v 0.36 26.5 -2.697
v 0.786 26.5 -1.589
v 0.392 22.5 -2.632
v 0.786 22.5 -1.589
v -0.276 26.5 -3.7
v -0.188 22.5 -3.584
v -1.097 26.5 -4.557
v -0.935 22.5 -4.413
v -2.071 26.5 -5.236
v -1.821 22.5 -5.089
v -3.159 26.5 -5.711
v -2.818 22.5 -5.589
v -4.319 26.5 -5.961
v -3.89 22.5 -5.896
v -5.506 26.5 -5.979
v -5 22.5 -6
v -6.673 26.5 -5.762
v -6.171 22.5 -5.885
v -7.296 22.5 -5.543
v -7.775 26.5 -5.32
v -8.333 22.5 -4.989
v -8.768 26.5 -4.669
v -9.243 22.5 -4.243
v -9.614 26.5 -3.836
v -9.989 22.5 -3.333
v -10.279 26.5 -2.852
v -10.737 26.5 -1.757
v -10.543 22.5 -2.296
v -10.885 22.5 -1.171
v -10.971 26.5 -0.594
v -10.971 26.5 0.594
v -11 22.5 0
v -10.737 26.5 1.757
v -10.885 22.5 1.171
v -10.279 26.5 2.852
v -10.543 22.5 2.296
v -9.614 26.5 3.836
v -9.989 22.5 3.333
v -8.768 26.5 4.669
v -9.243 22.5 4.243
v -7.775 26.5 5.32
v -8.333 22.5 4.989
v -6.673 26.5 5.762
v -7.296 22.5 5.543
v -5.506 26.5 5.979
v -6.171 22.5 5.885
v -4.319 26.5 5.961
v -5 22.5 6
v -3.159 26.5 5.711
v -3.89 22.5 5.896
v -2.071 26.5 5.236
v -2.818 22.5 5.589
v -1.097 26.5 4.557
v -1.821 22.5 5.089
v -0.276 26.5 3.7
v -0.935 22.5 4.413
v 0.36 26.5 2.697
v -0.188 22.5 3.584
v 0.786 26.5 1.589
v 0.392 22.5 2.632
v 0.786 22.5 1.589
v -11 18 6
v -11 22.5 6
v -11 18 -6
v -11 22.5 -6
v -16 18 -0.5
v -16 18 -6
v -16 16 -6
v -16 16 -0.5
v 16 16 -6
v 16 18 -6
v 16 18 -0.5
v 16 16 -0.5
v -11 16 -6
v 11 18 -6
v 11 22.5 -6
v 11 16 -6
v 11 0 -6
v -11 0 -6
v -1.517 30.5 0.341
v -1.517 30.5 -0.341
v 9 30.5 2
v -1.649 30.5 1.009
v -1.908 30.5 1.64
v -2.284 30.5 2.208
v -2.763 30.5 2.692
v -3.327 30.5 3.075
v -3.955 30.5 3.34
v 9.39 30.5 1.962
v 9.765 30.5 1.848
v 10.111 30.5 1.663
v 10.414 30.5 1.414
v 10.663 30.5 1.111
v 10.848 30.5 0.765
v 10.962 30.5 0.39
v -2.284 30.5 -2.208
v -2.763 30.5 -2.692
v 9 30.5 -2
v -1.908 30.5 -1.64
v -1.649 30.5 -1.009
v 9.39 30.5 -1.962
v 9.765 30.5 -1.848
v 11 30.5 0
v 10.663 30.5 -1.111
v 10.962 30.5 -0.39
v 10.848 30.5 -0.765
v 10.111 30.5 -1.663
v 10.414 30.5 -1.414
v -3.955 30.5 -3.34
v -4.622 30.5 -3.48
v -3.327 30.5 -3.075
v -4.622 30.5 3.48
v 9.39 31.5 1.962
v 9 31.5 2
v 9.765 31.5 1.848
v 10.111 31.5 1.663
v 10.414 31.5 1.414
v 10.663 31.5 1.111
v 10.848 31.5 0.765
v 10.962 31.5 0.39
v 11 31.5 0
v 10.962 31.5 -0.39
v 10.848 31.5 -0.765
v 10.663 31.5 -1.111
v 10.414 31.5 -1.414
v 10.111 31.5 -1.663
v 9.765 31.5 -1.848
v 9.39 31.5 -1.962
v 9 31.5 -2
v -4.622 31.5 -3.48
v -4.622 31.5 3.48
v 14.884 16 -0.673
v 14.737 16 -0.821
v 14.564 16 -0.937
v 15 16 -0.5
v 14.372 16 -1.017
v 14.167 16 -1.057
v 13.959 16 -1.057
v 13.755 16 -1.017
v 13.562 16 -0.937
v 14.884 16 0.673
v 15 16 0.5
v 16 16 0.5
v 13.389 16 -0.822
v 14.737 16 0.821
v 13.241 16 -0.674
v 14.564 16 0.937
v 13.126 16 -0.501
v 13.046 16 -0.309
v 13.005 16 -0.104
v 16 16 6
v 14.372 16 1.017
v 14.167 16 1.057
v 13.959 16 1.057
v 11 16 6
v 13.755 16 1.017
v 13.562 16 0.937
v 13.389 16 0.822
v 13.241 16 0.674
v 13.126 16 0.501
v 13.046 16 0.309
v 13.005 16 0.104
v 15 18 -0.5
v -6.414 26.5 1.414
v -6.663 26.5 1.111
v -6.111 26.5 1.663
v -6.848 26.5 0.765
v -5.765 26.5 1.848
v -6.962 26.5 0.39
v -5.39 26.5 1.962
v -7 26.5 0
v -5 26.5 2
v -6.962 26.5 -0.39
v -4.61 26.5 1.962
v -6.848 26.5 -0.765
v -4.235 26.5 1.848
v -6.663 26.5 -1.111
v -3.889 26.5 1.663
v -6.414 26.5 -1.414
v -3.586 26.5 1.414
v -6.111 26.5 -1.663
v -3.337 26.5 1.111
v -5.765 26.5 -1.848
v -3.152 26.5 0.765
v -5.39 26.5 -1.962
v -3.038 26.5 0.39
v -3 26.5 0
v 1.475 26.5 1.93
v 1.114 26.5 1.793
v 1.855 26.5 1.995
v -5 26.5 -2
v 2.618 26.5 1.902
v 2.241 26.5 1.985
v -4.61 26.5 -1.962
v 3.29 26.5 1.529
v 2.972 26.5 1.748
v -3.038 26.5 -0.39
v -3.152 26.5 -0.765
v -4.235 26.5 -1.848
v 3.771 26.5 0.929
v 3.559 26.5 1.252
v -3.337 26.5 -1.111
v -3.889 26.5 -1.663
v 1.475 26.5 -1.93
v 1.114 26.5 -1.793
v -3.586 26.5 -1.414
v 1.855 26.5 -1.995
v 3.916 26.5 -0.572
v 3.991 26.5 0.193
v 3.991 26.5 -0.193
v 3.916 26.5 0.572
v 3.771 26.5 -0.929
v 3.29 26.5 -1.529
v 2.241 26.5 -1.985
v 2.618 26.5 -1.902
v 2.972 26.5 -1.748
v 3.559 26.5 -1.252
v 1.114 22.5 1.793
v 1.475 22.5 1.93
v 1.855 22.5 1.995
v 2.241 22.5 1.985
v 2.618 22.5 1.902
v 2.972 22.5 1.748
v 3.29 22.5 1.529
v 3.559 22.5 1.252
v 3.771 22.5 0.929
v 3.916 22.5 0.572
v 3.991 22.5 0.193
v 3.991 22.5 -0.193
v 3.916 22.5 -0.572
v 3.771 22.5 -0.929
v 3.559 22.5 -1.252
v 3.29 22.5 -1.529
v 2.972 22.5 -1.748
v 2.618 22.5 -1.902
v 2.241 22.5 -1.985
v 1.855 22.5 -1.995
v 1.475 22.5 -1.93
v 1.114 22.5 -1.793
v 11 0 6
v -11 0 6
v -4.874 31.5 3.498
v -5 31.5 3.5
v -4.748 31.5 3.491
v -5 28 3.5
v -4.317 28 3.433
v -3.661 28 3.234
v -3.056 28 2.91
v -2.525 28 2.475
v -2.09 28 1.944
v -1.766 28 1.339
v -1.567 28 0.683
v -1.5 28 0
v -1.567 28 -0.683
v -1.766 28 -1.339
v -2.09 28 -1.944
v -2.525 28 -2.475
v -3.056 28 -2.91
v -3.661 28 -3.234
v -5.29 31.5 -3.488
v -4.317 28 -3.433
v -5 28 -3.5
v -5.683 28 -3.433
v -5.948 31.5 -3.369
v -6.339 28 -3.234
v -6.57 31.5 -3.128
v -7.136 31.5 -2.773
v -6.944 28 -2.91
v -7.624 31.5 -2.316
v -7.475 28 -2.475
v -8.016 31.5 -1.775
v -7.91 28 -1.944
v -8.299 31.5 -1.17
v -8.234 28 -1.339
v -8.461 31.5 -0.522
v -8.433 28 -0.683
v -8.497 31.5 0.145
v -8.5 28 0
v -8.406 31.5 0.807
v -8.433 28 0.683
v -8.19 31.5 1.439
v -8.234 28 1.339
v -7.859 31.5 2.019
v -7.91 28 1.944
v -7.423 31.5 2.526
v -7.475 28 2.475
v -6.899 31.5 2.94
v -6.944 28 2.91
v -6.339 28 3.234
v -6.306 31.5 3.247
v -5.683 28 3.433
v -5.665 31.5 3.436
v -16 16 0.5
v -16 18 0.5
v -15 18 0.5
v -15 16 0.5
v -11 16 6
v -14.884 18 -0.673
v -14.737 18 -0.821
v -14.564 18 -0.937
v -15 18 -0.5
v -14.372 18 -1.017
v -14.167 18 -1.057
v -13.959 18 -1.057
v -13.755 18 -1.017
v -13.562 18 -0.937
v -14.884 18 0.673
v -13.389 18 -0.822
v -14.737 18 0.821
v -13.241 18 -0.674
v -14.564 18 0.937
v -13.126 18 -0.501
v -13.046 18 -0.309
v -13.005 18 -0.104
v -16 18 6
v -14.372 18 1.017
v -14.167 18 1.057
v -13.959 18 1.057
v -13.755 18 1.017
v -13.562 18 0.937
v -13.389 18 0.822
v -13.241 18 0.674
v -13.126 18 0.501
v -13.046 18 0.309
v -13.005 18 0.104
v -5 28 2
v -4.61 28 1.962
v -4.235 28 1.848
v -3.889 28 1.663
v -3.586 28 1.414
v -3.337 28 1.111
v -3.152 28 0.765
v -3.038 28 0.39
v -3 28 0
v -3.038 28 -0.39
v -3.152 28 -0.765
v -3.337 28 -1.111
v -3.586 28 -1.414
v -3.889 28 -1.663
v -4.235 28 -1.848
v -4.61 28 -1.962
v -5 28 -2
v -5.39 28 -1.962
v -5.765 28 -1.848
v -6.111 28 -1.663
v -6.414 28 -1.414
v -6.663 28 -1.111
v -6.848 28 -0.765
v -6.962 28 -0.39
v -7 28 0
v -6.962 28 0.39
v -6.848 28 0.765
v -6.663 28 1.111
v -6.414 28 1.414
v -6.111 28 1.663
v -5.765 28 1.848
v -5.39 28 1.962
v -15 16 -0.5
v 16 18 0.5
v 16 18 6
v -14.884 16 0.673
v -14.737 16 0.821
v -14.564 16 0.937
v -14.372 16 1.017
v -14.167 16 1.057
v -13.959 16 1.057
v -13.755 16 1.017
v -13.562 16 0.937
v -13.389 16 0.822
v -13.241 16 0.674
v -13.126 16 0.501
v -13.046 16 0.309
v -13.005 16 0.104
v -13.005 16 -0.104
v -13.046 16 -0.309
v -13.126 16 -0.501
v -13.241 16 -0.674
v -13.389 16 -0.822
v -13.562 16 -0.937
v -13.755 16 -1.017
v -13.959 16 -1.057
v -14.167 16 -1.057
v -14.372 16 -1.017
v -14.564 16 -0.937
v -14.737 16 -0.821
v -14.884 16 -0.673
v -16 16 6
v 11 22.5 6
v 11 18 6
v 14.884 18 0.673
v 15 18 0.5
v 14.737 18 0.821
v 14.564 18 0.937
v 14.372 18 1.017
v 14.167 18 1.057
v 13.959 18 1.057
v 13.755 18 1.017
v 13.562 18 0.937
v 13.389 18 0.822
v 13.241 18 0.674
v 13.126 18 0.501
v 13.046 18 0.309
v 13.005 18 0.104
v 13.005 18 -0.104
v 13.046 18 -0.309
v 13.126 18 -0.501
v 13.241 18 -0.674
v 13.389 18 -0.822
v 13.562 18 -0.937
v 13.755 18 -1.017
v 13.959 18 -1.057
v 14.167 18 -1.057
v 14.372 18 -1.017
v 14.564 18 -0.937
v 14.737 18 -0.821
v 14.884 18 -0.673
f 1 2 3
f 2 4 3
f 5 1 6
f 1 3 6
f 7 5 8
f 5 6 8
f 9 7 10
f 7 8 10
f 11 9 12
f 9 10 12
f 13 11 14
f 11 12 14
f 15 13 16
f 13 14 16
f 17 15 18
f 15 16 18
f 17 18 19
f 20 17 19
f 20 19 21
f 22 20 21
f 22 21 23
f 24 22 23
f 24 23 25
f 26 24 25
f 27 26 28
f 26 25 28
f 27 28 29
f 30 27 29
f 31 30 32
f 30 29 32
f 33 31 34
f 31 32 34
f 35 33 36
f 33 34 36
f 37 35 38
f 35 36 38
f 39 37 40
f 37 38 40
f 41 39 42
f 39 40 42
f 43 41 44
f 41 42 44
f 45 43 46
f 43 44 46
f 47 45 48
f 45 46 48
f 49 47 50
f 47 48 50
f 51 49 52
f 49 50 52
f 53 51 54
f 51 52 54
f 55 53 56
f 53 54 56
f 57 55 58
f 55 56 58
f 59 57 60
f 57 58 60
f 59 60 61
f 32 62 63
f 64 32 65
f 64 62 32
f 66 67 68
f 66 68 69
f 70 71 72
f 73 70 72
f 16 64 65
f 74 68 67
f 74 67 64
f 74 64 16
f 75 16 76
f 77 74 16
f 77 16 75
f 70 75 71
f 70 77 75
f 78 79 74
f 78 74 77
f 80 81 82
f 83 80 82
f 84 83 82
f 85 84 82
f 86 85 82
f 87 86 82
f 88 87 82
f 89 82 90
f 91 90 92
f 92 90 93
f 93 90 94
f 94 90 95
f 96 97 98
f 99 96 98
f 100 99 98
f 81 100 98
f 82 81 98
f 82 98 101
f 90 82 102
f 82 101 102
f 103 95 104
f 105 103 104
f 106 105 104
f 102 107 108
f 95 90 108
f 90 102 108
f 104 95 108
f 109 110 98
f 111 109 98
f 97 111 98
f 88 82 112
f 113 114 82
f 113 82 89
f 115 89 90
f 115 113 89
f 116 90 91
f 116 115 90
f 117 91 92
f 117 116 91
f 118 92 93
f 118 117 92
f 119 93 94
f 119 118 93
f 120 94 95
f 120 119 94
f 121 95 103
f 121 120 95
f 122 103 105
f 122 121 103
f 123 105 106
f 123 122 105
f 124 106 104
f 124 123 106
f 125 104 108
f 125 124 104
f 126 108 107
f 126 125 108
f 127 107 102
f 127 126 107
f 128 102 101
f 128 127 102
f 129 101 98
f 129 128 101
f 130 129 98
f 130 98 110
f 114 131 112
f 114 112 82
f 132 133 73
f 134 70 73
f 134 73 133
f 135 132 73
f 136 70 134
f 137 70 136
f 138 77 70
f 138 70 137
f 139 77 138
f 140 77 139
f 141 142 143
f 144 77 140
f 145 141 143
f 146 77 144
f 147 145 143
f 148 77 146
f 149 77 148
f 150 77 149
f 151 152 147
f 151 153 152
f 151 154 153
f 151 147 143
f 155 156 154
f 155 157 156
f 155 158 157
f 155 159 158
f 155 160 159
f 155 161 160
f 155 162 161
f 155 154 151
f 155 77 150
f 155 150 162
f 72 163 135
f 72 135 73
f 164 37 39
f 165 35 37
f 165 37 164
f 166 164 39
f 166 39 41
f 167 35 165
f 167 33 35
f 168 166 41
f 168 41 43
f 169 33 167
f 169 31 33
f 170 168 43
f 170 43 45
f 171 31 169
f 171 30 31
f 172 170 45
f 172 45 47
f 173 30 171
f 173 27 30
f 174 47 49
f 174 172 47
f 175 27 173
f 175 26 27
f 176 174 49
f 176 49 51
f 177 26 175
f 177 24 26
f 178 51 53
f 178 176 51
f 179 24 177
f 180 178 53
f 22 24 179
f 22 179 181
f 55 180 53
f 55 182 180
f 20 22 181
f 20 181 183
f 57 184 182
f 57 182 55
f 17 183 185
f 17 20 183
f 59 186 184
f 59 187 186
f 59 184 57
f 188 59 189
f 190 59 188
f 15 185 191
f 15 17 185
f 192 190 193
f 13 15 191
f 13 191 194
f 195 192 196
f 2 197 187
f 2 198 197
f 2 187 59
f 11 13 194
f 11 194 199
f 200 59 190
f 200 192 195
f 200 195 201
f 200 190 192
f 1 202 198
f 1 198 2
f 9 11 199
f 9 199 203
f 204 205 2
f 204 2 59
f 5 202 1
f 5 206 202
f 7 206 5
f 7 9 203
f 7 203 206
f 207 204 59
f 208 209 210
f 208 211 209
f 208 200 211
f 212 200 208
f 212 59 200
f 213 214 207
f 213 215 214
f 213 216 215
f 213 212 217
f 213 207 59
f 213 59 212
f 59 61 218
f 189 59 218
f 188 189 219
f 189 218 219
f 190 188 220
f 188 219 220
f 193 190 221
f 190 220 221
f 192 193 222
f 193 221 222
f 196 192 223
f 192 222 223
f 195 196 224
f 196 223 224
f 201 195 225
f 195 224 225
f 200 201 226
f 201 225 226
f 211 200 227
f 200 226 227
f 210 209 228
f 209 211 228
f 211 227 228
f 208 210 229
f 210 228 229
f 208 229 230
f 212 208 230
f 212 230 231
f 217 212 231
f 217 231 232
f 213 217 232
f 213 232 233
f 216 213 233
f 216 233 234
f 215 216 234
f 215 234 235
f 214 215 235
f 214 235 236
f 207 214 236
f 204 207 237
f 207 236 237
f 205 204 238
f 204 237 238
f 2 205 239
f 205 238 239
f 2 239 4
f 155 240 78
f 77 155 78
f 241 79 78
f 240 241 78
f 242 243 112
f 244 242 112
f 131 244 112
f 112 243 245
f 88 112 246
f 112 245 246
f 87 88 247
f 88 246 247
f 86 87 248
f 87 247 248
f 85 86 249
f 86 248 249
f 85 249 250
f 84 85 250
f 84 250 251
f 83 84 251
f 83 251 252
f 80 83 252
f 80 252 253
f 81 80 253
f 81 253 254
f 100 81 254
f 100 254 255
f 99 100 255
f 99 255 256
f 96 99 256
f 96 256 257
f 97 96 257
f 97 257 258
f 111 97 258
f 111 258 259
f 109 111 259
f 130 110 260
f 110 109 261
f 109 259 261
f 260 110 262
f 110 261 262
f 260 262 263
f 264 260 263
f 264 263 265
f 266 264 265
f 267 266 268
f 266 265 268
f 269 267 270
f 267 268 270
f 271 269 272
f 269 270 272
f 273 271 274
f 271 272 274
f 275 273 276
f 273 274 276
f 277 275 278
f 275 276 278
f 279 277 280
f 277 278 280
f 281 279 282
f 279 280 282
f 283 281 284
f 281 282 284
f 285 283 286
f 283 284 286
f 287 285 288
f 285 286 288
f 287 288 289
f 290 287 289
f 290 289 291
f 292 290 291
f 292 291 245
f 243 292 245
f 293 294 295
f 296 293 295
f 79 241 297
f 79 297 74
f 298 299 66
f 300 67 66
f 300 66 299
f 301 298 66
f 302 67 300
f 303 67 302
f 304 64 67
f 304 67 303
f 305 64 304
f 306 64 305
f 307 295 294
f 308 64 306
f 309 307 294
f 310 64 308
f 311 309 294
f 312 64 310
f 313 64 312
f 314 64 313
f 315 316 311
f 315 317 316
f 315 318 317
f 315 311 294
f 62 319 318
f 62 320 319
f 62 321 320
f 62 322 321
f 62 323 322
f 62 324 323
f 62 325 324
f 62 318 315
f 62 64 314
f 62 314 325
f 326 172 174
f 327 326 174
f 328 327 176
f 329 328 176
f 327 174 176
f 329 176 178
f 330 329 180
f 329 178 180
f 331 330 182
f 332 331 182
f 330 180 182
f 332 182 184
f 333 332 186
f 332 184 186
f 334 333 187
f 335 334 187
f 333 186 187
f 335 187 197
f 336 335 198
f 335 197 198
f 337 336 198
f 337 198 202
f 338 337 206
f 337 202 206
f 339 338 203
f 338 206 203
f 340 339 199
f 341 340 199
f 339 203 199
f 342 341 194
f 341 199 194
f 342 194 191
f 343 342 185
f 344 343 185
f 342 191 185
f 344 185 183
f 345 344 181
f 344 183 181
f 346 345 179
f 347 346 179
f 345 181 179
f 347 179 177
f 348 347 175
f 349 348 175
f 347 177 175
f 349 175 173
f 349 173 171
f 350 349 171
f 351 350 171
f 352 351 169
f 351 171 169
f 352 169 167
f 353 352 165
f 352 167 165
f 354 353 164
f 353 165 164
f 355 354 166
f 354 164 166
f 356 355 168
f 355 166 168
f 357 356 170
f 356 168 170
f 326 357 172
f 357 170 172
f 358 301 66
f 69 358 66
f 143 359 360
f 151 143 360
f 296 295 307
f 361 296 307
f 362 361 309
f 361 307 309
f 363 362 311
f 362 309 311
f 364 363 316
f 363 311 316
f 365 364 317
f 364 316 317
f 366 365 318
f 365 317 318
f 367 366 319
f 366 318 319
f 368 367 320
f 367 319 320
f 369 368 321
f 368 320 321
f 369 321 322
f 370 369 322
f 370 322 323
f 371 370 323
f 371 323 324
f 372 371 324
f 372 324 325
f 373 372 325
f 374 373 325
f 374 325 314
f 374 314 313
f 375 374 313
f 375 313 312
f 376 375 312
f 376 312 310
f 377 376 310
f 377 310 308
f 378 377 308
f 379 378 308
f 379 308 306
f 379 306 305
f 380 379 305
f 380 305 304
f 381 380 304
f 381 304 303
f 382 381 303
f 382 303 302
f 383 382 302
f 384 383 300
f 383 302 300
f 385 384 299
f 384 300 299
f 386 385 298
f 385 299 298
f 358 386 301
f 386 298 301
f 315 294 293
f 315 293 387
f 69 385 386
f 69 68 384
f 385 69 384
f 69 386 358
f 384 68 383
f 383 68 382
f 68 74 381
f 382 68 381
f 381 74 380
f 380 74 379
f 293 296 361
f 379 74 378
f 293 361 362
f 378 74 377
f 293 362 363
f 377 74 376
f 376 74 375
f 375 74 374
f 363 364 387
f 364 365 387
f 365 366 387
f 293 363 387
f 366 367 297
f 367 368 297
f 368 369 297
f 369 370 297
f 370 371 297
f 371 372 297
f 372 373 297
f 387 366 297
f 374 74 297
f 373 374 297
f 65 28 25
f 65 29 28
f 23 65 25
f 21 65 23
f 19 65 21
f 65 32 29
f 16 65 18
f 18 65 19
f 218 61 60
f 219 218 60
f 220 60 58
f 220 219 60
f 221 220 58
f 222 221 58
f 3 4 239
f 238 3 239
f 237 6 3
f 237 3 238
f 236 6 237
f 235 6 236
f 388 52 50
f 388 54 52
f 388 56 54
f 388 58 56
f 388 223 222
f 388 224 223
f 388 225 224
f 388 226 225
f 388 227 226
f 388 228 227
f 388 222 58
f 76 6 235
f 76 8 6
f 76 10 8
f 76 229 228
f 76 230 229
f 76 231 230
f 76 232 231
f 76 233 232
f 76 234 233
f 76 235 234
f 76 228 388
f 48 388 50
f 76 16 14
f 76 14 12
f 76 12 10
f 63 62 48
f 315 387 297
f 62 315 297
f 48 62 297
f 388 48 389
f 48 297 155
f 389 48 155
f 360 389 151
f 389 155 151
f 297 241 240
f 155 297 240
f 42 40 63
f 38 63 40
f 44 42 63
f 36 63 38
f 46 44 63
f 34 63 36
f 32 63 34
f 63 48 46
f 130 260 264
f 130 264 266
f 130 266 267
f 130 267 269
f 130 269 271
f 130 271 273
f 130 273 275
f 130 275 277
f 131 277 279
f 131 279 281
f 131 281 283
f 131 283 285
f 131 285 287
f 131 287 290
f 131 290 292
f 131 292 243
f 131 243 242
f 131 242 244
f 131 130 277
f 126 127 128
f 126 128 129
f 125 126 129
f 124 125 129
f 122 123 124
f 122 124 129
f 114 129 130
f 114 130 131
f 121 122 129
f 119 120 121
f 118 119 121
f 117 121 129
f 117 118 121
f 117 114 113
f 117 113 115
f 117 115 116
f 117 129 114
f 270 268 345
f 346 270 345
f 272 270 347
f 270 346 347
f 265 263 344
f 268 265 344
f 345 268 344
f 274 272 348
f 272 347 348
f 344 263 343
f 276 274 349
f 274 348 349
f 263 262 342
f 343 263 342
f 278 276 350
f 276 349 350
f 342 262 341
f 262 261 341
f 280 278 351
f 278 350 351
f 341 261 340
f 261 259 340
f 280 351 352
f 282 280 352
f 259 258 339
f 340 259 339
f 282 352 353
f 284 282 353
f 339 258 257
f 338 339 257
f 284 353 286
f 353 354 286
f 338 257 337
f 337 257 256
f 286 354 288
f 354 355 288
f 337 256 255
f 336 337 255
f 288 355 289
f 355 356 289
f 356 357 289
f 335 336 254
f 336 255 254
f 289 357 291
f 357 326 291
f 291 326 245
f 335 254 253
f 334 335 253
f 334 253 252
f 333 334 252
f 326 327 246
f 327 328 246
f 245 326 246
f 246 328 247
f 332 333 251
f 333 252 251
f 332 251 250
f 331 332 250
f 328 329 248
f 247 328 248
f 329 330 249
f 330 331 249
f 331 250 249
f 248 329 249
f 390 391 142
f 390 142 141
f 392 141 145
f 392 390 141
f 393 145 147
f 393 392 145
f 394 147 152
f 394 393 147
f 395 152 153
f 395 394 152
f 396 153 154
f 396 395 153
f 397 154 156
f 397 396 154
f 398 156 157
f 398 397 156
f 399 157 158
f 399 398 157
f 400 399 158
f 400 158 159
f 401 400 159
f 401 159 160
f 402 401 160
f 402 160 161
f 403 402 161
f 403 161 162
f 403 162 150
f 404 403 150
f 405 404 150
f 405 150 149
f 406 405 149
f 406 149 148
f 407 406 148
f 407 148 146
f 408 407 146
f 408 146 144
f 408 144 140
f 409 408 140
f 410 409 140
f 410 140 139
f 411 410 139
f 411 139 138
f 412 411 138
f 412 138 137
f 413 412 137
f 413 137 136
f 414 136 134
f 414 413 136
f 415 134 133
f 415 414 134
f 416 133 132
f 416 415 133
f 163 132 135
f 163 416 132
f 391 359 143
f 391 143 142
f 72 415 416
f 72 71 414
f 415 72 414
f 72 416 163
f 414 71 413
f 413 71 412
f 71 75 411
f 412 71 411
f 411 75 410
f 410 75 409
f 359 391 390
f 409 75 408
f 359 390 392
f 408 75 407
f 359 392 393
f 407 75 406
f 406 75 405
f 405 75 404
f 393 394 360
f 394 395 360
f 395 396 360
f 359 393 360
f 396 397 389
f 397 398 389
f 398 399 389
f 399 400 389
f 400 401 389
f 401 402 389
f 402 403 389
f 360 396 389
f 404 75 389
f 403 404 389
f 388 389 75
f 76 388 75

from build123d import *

# Parameters (mm, degrees)
SKETCH1_W           = 22
SKETCH1_H           = 12
BOSS_EXTRUDE1_DEPTH = 22.5
SKETCH2_W           = 12
SKETCH2_H           = 2
BOSS_EXTRUDE2_DEPTH = 5
CUT_EXTRUDE1_REACH  = 26.819
SKETCH4_R           = 6
BOSS_EXTRUDE3_DEPTH = 4
SKETCH5_R           = 2
BOSS_EXTRUDE4_DEPTH = 4
SKETCH6_R           = 2
BOSS_EXTRUDE5_DEPTH = 1.5
SKETCH7_R           = 3.5
BOSS_EXTRUDE6_DEPTH = 3.5
BOSS_EXTRUDE7_DEPTH = 1


with BuildPart() as part:
    # Sketch1 → Boss-Extrude1 (new body)
    with BuildSketch(Plane(origin=(0, 0, 0), x_dir=(1, 0, 0), z_dir=(0, 1, 0))):
        Rectangle(SKETCH1_W, SKETCH1_H)
    extrude(amount=BOSS_EXTRUDE1_DEPTH)

    # Sketch2 → Boss-Extrude2 (add)
    with BuildSketch(Plane.ZY.offset(11)):
        with Locations((0, 17)):
            Rectangle(SKETCH2_W, SKETCH2_H)
    boss_extrude2 = extrude(amount=BOSS_EXTRUDE2_DEPTH)

    # Sketch3 → Cut-Extrude1 (cut, up to next)
    with BuildSketch(Plane(origin=(0, 18, 0), x_dir=(1, 0, 0), z_dir=(0, 1, 0)), mode=Mode.PRIVATE) as cut_extrude1_sk1:
        with BuildLine():
            Line((-16, 0.5), (-16, -0.5))
            Line((-16, -0.5), (-15, -0.5))
            ThreePointArc((-15, -0.5), (-13, 0), (-15, 0.5))
            Line((-15, 0.5), (-16, 0.5))
        make_face()
    cut_extrude1_tool1 = extrude(cut_extrude1_sk1.sketch, amount=-CUT_EXTRUDE1_REACH, mode=Mode.PRIVATE) & part.part
    cut_extrude1 = cut_extrude1_tool1.solids().sort_by_distance((-14.365975, 18, 0))[0]
    add(cut_extrude1, mode=Mode.SUBTRACT)

    # Mirror1: Boss-Extrude2, Cut-Extrude1 across plane
    add(boss_extrude2.mirror(Plane(origin=(0, 0, 0), x_dir=(0, 0, 1), z_dir=(1, 0, 0))))
    add(cut_extrude1.mirror(Plane(origin=(0, 0, 0), x_dir=(0, 0, 1), z_dir=(1, 0, 0))), mode=Mode.SUBTRACT)

    # Sketch4 → Boss-Extrude3 (add)
    with BuildSketch(Plane(origin=(0, 22.5, 0), x_dir=(1, 0, 0), z_dir=(0, 1, 0))):
        with Locations(Location((-5, 0, 0), (0, 0, 270))):
            Circle(SKETCH4_R)
    extrude(amount=BOSS_EXTRUDE3_DEPTH)

    # Sketch5 → Boss-Extrude4 (add)
    with BuildSketch(Plane(origin=(0, 22.5, 0), x_dir=(1, 0, 0), z_dir=(0, 1, 0))):
        with Locations((2, 0)):
            Circle(SKETCH5_R)
    extrude(amount=BOSS_EXTRUDE4_DEPTH)

    # Sketch6 → Boss-Extrude5 (add)
    with BuildSketch(Plane(origin=(0, 26.5, 0), x_dir=(1, 0, 0), z_dir=(0, 1, 0))):
        with Locations(Location((-5, 0, 0), (0, 0, 270))):
            Circle(SKETCH6_R)
    extrude(amount=BOSS_EXTRUDE5_DEPTH)

    # Sketch7 → Boss-Extrude6 (add)
    with BuildSketch(Plane(origin=(0, 28, 0), x_dir=(1, 0, 0), z_dir=(0, 1, 0))):
        with Locations(Location((-5, 0, 0), (0, 0, 270))):
            Circle(SKETCH7_R)
    extrude(amount=BOSS_EXTRUDE6_DEPTH)

    # Sketch8 → Boss-Extrude7 (add)
    with BuildSketch(Plane(origin=(0, 31.5, 0), x_dir=(1, 0, 0), z_dir=(0, 1, 0))):
        with BuildLine():
            Line((-4.622076636, 3.479536453), (-4.622076636, -3.479536453))
            Line((-4.622076636, -3.479536453), (9, -2))
            ThreePointArc((9, -2), (11, 0), (9, 2))
            Line((9, 2), (-4.622076636, 3.479536453))
        make_face()
    extrude(amount=-BOSS_EXTRUDE7_DEPTH)


solid = part.part
